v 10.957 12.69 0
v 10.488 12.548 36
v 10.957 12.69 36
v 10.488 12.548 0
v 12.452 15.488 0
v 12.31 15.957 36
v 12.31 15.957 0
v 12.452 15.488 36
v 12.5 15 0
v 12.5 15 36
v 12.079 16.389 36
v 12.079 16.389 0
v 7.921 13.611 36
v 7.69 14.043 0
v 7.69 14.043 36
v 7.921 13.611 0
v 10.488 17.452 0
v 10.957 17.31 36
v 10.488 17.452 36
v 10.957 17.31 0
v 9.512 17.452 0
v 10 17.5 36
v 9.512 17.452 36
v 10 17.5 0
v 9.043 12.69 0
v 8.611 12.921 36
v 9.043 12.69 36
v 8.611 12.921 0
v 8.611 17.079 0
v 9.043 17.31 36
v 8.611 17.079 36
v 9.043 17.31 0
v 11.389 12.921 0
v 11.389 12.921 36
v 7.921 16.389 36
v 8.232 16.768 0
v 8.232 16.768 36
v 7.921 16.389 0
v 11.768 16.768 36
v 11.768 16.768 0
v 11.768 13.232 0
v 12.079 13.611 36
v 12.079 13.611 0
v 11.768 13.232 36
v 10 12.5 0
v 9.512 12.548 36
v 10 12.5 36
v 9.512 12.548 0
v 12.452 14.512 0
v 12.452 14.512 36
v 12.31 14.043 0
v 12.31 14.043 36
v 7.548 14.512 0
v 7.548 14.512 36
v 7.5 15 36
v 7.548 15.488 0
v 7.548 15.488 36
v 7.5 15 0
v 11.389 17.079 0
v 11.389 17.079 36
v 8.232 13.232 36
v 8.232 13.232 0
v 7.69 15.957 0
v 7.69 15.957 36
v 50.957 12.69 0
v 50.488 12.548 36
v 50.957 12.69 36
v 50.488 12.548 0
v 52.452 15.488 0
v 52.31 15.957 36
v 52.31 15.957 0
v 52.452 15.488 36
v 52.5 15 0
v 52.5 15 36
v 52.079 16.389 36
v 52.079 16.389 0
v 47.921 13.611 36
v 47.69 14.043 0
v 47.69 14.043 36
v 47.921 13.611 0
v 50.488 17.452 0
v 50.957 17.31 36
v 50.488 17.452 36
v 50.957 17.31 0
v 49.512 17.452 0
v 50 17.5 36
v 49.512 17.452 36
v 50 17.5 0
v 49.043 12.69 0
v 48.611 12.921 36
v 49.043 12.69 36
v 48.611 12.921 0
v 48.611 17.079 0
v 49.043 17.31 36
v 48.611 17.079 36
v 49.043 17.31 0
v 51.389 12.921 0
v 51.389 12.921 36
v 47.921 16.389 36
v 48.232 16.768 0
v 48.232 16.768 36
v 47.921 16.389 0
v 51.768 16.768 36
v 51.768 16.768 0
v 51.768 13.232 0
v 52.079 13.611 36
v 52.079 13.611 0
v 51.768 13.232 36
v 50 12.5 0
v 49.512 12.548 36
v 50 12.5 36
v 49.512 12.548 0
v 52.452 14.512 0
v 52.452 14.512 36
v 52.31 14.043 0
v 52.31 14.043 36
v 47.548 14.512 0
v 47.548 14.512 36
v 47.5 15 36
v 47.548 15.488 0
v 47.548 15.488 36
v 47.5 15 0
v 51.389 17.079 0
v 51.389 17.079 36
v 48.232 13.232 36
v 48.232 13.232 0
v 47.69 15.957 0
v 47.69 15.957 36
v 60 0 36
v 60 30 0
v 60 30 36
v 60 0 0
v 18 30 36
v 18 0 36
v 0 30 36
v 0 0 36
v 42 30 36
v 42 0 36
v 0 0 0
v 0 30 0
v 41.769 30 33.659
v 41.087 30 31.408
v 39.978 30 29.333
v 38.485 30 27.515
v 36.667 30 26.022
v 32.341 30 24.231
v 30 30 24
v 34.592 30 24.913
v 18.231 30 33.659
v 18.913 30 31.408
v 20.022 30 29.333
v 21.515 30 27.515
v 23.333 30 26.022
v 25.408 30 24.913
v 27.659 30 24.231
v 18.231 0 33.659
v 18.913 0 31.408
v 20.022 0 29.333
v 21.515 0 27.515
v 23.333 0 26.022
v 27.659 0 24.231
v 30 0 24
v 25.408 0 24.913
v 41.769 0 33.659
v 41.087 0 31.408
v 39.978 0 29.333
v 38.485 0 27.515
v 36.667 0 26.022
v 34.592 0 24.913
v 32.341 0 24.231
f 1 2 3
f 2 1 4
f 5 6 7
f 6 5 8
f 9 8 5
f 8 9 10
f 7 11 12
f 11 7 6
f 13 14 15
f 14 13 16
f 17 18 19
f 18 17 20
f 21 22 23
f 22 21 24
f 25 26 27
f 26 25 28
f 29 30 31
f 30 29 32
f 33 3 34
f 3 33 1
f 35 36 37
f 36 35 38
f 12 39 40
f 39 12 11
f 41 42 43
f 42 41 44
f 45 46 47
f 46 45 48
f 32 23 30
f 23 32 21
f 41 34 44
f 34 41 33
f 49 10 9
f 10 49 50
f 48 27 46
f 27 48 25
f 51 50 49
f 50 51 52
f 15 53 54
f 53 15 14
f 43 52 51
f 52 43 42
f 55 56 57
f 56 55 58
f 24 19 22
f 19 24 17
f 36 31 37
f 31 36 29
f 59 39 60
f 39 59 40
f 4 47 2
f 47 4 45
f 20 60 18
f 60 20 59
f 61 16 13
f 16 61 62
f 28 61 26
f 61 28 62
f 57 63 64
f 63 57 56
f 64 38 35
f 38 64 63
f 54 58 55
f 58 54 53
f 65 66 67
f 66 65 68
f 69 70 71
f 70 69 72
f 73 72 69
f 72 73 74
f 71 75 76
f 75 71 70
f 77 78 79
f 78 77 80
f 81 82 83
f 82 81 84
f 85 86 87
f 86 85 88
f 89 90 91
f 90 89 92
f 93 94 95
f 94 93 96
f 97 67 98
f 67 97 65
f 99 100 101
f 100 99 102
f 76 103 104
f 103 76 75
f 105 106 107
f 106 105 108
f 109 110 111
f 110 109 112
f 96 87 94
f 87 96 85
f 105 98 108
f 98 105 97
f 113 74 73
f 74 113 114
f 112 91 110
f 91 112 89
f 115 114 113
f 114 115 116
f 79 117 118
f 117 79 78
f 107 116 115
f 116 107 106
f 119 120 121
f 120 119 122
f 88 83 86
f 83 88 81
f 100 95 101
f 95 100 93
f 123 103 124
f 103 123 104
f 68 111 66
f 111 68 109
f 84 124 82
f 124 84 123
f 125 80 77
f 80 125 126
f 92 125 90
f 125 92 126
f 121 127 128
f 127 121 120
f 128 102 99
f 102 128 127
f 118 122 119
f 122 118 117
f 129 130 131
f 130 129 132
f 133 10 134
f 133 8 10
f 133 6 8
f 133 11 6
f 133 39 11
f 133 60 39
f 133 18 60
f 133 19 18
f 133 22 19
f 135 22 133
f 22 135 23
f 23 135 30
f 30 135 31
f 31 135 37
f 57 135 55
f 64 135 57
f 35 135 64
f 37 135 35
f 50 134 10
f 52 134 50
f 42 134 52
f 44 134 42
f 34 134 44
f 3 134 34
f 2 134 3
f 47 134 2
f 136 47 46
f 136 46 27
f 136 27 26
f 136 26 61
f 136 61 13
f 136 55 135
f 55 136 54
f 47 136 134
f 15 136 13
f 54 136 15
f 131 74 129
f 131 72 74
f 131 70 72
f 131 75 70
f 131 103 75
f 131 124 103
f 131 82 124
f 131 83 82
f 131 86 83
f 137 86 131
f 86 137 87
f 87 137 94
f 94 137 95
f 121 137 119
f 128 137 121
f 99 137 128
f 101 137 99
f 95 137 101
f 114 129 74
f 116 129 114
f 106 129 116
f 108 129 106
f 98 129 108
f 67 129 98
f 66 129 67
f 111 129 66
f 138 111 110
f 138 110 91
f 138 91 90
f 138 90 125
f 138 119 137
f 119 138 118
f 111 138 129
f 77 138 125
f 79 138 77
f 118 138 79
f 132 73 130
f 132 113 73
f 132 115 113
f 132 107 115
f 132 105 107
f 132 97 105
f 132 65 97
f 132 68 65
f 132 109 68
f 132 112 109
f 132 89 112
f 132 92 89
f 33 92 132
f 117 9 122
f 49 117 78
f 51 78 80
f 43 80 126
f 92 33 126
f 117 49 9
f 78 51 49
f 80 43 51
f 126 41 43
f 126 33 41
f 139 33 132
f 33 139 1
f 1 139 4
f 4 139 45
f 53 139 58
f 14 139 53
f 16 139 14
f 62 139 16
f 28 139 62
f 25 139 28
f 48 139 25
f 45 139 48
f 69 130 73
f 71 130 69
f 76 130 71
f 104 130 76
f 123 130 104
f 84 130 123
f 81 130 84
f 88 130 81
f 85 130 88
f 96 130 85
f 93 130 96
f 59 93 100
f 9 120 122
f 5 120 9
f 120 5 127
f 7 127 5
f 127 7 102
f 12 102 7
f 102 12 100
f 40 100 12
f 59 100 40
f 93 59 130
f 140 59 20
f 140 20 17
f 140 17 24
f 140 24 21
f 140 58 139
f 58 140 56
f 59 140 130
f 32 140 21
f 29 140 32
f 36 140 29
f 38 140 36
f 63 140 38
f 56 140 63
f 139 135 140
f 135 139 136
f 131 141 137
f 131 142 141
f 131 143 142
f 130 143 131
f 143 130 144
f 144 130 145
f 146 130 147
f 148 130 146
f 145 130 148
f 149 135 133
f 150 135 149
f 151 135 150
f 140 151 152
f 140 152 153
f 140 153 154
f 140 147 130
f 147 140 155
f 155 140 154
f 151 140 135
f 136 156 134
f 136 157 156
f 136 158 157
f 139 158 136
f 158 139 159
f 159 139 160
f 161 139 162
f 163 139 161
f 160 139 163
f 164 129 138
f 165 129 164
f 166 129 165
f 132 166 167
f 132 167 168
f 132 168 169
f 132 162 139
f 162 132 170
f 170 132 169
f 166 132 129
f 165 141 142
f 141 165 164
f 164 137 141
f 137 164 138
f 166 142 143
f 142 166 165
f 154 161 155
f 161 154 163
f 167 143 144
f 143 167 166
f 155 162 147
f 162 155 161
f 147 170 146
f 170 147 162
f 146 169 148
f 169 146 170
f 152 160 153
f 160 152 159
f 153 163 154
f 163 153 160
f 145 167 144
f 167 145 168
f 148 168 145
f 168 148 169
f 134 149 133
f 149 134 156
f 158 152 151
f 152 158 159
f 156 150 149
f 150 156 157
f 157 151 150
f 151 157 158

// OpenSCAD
$fn = 32;

// ----------------------------------------------------------------------
// Saddle clamp: plain shaft clamp
// ----------------------------------------------------------------------

// --- parameters (mm) ---
blk_l = 60;               // block length, X
blk_w = 30;               // block width, Y
blk_h = 36;               // block height
clamp_r = 12;             // shaft groove radius
hole_r = 2.5;             // bolt hole radius
hole_m = 10;              // bolt hole margin from the ends

saw_depth = clamp_r + 3;  // saw kerf depth

difference() {
  cube([blk_l, blk_w, blk_h]);
  translate([blk_l / 2, -1, blk_h])
    rotate([-90, 0, 0])
      cylinder(h = blk_w + 2, r = clamp_r);
  for (sx = [0, 1])
    translate([sx ? blk_l - hole_m : hole_m, blk_w / 2, -1])
      cylinder(r = hole_r, h = blk_h + 2);
}
